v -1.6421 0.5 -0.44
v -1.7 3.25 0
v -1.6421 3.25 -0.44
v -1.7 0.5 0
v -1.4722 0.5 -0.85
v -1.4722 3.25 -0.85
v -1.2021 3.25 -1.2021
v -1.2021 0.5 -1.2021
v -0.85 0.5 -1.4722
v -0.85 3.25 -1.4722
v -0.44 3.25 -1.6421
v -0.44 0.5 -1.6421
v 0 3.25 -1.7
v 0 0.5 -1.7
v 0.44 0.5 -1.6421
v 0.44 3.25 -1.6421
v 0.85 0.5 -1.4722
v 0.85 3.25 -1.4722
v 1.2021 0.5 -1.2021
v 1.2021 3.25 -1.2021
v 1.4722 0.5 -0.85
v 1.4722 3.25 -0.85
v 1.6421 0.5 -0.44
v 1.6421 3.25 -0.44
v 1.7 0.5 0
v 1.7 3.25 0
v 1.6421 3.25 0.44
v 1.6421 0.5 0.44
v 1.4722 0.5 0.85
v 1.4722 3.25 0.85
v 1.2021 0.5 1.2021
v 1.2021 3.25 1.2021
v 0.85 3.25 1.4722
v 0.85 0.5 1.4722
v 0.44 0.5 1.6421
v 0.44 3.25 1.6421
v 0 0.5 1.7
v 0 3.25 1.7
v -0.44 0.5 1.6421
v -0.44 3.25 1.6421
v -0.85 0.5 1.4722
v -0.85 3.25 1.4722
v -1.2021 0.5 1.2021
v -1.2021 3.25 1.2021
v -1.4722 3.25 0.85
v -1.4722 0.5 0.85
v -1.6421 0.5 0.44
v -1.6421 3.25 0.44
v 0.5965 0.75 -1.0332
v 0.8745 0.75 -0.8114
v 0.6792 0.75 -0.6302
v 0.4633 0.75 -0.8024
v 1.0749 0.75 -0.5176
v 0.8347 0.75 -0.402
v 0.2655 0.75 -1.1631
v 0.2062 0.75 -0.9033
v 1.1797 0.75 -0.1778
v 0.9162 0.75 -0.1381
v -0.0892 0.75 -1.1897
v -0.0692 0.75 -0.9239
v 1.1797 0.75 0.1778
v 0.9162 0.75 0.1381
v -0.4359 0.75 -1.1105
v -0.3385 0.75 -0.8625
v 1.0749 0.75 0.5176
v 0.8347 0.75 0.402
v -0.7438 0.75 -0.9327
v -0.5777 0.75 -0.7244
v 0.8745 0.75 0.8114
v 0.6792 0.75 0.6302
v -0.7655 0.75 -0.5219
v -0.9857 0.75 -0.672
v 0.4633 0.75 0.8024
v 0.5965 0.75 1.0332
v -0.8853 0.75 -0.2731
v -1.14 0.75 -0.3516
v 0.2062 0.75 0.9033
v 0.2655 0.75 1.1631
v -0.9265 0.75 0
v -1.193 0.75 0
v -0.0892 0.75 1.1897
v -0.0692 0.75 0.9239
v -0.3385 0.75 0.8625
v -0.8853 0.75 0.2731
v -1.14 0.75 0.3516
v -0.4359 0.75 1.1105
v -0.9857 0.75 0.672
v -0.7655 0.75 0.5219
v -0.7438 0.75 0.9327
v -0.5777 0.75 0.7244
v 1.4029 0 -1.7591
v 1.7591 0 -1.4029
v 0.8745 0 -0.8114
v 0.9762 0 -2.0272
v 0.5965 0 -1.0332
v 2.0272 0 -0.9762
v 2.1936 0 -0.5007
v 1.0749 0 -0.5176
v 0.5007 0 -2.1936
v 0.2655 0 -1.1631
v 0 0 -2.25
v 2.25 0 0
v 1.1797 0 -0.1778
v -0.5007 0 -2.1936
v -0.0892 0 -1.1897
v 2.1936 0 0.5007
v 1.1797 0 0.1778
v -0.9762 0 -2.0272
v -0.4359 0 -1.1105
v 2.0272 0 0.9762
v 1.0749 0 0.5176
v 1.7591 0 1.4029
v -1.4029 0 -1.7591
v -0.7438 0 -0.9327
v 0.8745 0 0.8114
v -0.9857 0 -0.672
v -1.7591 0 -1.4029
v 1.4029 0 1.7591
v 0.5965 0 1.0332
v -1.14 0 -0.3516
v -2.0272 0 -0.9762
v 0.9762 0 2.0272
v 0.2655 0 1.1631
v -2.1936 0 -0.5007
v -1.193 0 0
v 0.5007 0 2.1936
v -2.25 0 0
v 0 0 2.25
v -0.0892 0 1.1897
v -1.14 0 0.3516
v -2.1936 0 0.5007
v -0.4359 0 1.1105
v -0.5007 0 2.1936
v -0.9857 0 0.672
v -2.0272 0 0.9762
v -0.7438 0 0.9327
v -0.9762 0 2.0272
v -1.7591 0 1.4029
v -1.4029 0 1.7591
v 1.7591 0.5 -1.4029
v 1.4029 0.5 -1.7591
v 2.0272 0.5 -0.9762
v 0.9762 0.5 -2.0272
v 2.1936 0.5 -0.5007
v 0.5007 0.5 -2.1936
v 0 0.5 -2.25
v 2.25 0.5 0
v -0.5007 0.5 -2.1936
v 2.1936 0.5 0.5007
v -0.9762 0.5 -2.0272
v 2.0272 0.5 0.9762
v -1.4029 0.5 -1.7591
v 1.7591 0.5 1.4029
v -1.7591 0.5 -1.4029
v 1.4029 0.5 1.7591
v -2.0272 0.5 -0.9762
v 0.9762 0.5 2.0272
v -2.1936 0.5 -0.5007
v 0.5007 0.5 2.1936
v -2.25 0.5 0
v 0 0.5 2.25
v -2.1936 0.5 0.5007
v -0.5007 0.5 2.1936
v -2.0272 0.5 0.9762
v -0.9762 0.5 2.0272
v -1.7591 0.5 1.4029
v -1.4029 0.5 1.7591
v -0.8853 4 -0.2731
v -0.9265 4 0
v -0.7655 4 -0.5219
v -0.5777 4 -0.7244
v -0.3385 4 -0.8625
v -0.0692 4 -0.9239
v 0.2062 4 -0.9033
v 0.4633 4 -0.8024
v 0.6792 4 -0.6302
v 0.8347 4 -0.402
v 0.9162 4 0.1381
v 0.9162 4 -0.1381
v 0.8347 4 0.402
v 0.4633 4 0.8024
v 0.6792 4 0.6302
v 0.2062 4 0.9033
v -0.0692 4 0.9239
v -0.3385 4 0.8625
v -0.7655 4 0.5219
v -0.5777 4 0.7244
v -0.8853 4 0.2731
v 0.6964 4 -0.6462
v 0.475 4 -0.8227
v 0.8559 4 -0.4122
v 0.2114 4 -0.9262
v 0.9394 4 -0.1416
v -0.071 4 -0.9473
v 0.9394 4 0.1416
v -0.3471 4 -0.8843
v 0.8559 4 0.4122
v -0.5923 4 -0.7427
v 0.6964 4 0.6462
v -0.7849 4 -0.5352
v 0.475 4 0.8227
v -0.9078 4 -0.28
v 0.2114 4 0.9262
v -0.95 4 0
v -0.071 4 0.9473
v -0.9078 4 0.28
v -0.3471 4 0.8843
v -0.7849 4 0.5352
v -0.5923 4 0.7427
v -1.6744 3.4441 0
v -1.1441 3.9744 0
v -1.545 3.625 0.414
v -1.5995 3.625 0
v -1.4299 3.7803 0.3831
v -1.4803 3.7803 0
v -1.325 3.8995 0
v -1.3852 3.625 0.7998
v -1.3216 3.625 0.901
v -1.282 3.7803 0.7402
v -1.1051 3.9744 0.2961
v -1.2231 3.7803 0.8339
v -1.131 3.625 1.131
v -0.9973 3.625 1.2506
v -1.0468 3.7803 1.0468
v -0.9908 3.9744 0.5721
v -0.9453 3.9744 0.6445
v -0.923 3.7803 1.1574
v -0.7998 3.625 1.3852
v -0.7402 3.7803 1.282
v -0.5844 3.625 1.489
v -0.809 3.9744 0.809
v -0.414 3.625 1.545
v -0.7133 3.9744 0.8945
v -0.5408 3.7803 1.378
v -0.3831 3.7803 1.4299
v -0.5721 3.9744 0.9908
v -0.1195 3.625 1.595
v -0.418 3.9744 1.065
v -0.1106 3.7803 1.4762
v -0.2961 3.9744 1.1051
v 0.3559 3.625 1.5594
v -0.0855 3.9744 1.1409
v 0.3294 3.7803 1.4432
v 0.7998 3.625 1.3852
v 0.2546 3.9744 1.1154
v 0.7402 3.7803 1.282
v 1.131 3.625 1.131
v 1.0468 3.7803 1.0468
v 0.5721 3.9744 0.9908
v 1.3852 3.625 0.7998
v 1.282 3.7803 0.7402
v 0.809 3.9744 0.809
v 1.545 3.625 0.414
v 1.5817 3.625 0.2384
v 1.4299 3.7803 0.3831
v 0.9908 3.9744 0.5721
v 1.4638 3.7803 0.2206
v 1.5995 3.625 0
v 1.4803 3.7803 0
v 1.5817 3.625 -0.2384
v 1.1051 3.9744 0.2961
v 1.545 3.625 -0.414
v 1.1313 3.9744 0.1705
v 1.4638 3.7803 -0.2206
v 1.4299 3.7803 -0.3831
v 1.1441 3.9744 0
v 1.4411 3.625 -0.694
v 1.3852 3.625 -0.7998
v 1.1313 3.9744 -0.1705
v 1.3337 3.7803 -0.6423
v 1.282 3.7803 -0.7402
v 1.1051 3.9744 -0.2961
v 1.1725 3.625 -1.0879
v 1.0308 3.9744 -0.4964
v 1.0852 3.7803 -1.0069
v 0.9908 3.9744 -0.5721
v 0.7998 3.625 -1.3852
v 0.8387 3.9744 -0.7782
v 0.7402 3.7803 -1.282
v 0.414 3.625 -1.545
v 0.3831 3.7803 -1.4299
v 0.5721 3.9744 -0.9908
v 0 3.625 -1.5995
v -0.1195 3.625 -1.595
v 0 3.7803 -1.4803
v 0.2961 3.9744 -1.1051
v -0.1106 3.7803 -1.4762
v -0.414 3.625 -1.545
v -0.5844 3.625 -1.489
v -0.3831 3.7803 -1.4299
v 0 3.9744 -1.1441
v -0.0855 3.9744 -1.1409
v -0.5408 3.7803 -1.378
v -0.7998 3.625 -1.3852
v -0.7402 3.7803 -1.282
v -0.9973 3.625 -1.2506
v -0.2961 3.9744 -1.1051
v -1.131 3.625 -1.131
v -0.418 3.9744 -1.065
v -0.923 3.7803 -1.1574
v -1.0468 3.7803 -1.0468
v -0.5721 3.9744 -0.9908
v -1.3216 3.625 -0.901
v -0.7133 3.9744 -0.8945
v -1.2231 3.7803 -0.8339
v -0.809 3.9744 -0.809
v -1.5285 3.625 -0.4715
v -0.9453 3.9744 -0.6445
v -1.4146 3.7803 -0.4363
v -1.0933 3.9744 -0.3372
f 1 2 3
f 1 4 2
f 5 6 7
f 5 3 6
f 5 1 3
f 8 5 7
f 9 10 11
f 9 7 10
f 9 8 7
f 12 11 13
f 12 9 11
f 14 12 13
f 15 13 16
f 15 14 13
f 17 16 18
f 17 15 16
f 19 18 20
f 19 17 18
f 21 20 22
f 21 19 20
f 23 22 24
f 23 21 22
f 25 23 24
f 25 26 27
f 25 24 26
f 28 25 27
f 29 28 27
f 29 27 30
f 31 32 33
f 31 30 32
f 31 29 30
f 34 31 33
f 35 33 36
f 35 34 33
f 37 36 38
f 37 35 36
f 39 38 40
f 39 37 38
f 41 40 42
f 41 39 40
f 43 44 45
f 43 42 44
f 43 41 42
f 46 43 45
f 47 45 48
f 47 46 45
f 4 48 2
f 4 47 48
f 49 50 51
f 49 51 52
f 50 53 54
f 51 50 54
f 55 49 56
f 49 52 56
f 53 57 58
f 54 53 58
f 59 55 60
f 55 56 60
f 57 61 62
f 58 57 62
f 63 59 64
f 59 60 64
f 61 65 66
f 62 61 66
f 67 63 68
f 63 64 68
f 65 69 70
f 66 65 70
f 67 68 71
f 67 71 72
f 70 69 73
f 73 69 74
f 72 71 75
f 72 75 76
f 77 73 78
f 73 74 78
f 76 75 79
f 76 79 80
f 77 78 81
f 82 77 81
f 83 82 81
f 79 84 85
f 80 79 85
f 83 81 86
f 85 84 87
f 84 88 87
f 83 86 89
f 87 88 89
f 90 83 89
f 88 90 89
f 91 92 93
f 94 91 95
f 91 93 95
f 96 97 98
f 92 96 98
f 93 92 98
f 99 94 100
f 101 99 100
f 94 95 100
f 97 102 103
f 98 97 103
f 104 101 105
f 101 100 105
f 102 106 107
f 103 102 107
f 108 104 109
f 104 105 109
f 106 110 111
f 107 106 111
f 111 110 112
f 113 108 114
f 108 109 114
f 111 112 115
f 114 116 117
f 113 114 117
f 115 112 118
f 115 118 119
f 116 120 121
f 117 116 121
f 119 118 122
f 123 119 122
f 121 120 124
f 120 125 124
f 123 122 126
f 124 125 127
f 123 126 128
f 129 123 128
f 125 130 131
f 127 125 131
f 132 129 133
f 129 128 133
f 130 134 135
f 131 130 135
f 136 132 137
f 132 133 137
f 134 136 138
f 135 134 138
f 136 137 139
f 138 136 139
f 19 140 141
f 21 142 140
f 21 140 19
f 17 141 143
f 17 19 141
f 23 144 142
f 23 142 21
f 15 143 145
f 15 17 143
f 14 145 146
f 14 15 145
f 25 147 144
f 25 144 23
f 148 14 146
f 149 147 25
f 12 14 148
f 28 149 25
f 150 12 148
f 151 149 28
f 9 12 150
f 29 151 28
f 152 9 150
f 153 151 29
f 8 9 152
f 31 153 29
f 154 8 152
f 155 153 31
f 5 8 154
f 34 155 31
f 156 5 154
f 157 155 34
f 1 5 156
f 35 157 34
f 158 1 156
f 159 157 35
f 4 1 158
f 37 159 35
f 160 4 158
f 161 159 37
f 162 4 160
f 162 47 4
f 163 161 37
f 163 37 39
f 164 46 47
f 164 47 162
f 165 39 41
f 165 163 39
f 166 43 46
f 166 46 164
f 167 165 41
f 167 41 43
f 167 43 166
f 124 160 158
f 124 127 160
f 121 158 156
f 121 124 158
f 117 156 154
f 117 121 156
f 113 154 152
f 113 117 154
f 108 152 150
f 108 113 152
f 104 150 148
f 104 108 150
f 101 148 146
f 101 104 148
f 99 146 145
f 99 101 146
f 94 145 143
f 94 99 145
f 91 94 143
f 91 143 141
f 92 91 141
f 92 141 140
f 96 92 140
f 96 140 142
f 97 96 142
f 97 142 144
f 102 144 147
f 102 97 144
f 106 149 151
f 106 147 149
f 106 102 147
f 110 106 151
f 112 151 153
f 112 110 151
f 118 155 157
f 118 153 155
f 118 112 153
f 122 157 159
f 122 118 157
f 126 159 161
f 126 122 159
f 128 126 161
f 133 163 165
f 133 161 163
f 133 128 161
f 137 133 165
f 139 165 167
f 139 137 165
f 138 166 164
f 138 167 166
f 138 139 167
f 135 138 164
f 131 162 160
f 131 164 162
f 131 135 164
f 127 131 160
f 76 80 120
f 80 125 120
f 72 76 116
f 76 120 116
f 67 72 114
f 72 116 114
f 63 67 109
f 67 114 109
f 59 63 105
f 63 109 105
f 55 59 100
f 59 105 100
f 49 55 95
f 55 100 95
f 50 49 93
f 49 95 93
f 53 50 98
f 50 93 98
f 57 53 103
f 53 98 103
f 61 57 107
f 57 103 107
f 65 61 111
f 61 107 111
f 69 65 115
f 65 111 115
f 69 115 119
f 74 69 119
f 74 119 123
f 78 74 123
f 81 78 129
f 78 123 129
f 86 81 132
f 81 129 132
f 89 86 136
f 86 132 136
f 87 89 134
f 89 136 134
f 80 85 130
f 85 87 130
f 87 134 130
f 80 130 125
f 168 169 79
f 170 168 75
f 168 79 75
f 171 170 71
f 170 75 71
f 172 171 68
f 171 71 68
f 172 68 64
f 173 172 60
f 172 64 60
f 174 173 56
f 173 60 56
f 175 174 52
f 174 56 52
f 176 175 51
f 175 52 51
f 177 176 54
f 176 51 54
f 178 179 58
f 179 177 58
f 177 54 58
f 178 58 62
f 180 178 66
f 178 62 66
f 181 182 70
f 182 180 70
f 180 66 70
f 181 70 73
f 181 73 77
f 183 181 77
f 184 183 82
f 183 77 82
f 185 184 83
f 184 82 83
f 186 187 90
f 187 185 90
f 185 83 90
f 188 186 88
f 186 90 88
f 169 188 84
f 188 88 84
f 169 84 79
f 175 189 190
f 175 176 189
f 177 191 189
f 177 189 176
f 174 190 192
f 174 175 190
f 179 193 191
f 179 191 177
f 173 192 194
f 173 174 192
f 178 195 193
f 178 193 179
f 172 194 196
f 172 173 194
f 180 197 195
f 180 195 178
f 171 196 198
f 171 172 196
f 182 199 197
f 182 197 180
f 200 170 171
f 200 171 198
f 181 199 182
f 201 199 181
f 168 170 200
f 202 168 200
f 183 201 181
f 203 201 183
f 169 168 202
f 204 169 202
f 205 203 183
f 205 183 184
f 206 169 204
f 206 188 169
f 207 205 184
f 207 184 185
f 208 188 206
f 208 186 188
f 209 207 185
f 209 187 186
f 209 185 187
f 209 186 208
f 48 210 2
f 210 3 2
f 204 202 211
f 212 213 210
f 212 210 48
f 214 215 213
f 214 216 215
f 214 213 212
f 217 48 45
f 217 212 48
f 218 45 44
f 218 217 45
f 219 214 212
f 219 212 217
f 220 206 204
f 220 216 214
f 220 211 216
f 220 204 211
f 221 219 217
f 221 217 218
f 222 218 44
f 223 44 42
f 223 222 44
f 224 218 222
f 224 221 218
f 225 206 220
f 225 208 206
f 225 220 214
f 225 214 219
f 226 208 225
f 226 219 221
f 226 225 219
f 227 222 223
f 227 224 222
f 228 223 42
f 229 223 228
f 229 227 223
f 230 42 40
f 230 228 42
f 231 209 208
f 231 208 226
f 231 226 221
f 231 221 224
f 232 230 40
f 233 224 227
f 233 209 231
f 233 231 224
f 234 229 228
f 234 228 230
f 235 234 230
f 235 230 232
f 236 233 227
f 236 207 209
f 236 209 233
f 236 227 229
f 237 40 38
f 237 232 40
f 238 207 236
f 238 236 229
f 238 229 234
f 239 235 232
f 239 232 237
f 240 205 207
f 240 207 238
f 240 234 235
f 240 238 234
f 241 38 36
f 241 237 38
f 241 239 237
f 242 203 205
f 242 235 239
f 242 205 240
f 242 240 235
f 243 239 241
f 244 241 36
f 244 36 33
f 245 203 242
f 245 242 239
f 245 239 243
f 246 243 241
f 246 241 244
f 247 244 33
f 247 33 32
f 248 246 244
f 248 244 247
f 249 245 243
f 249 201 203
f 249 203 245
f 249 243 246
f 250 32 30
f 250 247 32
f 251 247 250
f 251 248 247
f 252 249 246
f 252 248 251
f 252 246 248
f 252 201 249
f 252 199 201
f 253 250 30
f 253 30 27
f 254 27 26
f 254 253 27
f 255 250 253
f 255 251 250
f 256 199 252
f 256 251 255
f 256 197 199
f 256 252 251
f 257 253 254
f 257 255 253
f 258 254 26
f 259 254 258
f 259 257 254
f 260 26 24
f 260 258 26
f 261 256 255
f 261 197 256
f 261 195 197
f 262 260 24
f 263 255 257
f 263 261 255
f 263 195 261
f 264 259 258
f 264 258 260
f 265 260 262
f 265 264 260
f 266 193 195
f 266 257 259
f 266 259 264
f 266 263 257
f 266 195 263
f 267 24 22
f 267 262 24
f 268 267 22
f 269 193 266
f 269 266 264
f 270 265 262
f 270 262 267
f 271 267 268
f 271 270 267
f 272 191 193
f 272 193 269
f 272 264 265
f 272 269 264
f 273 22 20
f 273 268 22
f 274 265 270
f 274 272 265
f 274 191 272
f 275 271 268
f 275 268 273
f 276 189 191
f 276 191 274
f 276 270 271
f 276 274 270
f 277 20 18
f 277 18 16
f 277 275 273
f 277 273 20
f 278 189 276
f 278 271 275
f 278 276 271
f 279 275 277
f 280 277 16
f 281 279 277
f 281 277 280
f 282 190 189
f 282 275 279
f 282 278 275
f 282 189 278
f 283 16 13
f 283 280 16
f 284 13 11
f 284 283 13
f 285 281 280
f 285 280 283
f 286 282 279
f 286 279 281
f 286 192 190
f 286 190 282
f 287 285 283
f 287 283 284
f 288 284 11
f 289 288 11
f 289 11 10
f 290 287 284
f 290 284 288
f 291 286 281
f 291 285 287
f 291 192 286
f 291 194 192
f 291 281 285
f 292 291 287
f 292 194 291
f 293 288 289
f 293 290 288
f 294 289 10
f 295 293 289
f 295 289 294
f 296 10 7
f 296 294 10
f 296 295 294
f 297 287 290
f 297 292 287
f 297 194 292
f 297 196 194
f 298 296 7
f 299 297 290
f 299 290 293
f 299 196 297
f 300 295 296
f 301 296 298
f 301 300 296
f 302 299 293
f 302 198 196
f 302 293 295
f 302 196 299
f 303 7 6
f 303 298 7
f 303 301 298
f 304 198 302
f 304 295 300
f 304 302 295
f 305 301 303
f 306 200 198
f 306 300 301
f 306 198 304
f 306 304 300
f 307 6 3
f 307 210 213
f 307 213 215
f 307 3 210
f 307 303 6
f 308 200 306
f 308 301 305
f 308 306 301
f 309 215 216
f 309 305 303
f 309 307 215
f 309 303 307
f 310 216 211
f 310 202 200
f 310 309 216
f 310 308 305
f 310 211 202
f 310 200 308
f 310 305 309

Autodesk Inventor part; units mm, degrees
ref_plane "YZ Plane" through (0, 0, 0) normal (1, 0, 0) x (0, 1, 0)
ref_plane "XZ Plane" through (0, 0, 0) normal (0, 1, 0) x (-1, 0, 0)
ref_plane "XY Plane" through (0, 0, 0) normal (0, 0, 1) x (1, 0, 0)
sketch "Sketch1" plane through (0, 0, 0) normal (0, 1, 0) x (-1, 0, 0)
  circle A0 centre (0, 0) radius 0.9265
  circle A1 centre (0, 0) radius 1.7
  circle A2 centre (0, 0) radius 2.25
  dimension "d0" = 1.853
  dimension "d2" = 3.4
  dimension "d8" = 4.5
sketch "Sketch2" plane through (0, 0, 0) normal (0, 1, 0) x (-1, 0, 0)
  circle A0 centre (0, 0) radius 1.193
  dimension "d3" = 2.386
extrude "Extrusion1" add sketch "Sketch1" along normal blind 4 contours A1
extrude "Extrusion2" cut sketch "Sketch2" along normal blind 0.75
sketch "Sketch3" plane through (0, 0, 0) normal (0, -1, 0) x (1, 0, 0)
  point P0 (0, 0)
extrude "Extrusion3" add sketch "Sketch1" along normal blind 0.5 contours A2
fillet "Fillet1" radius 0.75 1 edges at (1.7, 4, 0)
properties part number "Lumipositor-WirePins"
